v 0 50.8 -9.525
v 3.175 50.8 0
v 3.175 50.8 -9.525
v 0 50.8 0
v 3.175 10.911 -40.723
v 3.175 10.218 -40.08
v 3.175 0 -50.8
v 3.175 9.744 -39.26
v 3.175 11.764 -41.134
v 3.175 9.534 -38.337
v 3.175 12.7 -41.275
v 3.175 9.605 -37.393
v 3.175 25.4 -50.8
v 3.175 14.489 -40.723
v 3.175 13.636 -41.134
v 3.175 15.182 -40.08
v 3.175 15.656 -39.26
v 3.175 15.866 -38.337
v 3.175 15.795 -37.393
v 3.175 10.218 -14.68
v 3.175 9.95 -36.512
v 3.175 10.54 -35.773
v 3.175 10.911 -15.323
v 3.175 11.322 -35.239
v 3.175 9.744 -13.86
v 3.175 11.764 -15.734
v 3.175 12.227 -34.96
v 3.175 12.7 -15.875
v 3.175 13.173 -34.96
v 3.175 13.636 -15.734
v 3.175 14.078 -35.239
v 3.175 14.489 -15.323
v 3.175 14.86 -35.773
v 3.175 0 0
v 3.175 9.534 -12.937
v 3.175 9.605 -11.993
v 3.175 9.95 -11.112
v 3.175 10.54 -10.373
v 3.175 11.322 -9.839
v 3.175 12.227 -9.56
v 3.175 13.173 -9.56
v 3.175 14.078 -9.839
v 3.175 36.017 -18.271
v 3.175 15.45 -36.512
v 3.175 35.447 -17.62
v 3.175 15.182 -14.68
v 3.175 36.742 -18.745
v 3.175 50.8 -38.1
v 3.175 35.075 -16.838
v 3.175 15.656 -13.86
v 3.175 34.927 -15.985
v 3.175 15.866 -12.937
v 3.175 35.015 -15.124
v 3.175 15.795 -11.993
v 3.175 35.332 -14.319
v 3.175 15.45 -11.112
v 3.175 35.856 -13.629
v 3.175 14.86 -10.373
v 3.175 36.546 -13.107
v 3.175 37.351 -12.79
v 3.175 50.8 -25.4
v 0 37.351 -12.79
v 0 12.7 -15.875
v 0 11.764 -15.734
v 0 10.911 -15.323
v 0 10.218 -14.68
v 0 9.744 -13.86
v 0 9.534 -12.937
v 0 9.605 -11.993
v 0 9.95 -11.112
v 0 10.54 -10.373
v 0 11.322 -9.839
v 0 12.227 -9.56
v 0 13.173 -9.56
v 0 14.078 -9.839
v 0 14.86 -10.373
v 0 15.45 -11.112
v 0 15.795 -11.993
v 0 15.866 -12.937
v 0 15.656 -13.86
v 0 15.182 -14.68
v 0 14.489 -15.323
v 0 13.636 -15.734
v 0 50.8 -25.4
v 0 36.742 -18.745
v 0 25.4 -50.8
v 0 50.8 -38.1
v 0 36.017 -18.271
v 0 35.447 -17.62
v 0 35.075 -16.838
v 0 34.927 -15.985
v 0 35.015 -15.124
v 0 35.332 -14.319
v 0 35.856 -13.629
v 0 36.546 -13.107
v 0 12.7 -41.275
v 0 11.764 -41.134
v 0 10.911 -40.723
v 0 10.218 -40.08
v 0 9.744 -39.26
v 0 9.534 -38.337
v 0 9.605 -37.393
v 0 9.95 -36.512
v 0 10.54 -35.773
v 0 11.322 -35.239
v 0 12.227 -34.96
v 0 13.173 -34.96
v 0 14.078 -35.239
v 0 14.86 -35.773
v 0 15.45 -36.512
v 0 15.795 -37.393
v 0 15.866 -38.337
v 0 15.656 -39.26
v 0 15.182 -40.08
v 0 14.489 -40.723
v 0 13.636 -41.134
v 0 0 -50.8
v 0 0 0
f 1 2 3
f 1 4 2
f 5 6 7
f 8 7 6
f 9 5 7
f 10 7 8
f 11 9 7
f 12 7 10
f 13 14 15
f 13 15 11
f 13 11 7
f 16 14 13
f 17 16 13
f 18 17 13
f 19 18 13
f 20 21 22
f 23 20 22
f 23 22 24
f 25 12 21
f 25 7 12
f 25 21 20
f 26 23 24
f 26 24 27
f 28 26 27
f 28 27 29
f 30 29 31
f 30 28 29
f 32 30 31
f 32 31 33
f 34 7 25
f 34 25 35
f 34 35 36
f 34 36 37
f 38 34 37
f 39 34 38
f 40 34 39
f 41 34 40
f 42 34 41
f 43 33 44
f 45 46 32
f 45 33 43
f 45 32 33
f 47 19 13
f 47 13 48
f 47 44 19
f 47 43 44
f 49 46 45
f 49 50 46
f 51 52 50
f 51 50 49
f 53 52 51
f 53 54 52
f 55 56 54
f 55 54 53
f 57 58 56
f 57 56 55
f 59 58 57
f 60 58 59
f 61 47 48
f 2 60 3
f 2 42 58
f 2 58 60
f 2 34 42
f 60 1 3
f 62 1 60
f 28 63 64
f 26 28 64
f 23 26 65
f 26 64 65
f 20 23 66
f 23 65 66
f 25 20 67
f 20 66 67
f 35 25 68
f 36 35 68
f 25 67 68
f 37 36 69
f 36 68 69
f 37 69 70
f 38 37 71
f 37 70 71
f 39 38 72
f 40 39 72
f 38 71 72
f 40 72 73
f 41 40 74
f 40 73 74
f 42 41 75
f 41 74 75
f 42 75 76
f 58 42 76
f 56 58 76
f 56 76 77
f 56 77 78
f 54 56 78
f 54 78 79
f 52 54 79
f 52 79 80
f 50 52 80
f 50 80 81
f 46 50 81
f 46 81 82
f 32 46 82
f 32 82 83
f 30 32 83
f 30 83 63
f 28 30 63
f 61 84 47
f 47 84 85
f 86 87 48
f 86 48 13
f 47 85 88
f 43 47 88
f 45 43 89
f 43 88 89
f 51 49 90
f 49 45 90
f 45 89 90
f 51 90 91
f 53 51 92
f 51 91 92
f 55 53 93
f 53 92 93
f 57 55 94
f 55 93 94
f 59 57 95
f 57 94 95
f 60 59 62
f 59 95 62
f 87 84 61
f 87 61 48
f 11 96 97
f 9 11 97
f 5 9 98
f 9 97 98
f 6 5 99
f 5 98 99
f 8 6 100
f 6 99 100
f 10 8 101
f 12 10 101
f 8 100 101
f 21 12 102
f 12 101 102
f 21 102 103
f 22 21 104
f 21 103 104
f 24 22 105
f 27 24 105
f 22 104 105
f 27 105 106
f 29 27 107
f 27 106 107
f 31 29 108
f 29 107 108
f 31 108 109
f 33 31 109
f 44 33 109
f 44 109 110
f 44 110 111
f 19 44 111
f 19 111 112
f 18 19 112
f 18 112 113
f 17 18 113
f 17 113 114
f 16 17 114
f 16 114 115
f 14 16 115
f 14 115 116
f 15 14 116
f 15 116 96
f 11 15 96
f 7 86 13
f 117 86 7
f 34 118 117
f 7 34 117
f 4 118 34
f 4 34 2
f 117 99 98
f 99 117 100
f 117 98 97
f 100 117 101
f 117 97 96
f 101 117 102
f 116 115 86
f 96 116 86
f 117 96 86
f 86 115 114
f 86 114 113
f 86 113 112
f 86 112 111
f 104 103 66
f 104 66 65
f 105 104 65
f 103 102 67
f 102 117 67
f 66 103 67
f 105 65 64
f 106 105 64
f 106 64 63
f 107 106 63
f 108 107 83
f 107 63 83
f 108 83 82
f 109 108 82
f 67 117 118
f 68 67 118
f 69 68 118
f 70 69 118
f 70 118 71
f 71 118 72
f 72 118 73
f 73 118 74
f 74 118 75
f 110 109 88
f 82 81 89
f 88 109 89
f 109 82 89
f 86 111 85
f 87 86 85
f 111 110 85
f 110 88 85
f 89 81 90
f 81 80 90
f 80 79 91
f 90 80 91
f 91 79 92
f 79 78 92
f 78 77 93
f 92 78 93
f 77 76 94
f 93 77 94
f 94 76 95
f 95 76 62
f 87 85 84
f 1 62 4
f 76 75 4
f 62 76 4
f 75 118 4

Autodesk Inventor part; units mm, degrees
ref_plane "YZ Plane" through (0, 0, 0) normal (1, 0, 0) x (0, 1, 0)
ref_plane "XZ Plane" through (0, 0, 0) normal (0, 1, 0) x (-1, 0, 0)
ref_plane "XY Plane" through (0, 0, 0) normal (0, 0, 1) x (1, 0, 0)
sketch "Sketch1" plane through (0, 0, 0) normal (1, 0, 0) x (0, 1, 0)
  line L0 (0, 0) -> (50.8, 0) construction
  line L1 (50.8, 0) -> (50.8, -50.8) construction
  line L2 (50.8, -50.8) -> (0, -50.8) construction
  line L3 (0, -50.8) -> (0, 0) construction
  line L4 (0, 0) -> (50.8, 0)
  line L5 (50.8, 0) -> (50.8, -9.525)
  line L6 (0, 0) -> (0, -50.8)
  line L7 (50.8, -25.4) -> (50.8, -38.1)
  line L8 (50.8, -38.1) -> (25.4, -50.8)
  line L9 (25.4, -50.8) -> (0, -50.8)
  circle A0 centre (38.1, -15.875) radius 3.175 construction
  line L10 (50.8, -9.525) -> (37.351, -12.7896)
  line L11 (50.8, -25.4) -> (36.7415, -18.7447)
  arc A1 (37.351, -12.7896) -> (36.7415, -18.7447) centre (38.1, -15.875) ccw
  dimension "d0" = 50.8
  dimension "d1" = 50.8
  dimension "d2" = 9.525
  dimension "d3" = 12.7
  dimension "d6" = 6.35
  dimension "d7" = 12.7
  dimension "d8" = 15.875
  dimension "d22" = 25.4
  dimension "d23" = 12.7
extrude "Extrusion1" add sketch "Sketch1" along normal blind 3.175
sketch "Sketch2" plane through (3.175, 0, 0) normal (1, 0, 0) x (0, 0, -1)
  line L0 (0, 50.8) -> (0, 0) projected
  line L1 (0, 0) -> (50.8, 0) projected
  point P0 (12.7, 12.7)
  point P1 (38.1, 12.7)
  dimension "d11" = 12.7
  dimension "d12" = 12.7
  dimension "d13" = 12.7
  dimension "d14" = 38.1
hole "Hole1" at (3.175, 12.7, -12.7) at (3.175, 12.7, -38.1) direction (-1, 0, 0) diameter 6.35 end through all
properties part number "pickup arm tab with hook" material "Aluminum 6061"
